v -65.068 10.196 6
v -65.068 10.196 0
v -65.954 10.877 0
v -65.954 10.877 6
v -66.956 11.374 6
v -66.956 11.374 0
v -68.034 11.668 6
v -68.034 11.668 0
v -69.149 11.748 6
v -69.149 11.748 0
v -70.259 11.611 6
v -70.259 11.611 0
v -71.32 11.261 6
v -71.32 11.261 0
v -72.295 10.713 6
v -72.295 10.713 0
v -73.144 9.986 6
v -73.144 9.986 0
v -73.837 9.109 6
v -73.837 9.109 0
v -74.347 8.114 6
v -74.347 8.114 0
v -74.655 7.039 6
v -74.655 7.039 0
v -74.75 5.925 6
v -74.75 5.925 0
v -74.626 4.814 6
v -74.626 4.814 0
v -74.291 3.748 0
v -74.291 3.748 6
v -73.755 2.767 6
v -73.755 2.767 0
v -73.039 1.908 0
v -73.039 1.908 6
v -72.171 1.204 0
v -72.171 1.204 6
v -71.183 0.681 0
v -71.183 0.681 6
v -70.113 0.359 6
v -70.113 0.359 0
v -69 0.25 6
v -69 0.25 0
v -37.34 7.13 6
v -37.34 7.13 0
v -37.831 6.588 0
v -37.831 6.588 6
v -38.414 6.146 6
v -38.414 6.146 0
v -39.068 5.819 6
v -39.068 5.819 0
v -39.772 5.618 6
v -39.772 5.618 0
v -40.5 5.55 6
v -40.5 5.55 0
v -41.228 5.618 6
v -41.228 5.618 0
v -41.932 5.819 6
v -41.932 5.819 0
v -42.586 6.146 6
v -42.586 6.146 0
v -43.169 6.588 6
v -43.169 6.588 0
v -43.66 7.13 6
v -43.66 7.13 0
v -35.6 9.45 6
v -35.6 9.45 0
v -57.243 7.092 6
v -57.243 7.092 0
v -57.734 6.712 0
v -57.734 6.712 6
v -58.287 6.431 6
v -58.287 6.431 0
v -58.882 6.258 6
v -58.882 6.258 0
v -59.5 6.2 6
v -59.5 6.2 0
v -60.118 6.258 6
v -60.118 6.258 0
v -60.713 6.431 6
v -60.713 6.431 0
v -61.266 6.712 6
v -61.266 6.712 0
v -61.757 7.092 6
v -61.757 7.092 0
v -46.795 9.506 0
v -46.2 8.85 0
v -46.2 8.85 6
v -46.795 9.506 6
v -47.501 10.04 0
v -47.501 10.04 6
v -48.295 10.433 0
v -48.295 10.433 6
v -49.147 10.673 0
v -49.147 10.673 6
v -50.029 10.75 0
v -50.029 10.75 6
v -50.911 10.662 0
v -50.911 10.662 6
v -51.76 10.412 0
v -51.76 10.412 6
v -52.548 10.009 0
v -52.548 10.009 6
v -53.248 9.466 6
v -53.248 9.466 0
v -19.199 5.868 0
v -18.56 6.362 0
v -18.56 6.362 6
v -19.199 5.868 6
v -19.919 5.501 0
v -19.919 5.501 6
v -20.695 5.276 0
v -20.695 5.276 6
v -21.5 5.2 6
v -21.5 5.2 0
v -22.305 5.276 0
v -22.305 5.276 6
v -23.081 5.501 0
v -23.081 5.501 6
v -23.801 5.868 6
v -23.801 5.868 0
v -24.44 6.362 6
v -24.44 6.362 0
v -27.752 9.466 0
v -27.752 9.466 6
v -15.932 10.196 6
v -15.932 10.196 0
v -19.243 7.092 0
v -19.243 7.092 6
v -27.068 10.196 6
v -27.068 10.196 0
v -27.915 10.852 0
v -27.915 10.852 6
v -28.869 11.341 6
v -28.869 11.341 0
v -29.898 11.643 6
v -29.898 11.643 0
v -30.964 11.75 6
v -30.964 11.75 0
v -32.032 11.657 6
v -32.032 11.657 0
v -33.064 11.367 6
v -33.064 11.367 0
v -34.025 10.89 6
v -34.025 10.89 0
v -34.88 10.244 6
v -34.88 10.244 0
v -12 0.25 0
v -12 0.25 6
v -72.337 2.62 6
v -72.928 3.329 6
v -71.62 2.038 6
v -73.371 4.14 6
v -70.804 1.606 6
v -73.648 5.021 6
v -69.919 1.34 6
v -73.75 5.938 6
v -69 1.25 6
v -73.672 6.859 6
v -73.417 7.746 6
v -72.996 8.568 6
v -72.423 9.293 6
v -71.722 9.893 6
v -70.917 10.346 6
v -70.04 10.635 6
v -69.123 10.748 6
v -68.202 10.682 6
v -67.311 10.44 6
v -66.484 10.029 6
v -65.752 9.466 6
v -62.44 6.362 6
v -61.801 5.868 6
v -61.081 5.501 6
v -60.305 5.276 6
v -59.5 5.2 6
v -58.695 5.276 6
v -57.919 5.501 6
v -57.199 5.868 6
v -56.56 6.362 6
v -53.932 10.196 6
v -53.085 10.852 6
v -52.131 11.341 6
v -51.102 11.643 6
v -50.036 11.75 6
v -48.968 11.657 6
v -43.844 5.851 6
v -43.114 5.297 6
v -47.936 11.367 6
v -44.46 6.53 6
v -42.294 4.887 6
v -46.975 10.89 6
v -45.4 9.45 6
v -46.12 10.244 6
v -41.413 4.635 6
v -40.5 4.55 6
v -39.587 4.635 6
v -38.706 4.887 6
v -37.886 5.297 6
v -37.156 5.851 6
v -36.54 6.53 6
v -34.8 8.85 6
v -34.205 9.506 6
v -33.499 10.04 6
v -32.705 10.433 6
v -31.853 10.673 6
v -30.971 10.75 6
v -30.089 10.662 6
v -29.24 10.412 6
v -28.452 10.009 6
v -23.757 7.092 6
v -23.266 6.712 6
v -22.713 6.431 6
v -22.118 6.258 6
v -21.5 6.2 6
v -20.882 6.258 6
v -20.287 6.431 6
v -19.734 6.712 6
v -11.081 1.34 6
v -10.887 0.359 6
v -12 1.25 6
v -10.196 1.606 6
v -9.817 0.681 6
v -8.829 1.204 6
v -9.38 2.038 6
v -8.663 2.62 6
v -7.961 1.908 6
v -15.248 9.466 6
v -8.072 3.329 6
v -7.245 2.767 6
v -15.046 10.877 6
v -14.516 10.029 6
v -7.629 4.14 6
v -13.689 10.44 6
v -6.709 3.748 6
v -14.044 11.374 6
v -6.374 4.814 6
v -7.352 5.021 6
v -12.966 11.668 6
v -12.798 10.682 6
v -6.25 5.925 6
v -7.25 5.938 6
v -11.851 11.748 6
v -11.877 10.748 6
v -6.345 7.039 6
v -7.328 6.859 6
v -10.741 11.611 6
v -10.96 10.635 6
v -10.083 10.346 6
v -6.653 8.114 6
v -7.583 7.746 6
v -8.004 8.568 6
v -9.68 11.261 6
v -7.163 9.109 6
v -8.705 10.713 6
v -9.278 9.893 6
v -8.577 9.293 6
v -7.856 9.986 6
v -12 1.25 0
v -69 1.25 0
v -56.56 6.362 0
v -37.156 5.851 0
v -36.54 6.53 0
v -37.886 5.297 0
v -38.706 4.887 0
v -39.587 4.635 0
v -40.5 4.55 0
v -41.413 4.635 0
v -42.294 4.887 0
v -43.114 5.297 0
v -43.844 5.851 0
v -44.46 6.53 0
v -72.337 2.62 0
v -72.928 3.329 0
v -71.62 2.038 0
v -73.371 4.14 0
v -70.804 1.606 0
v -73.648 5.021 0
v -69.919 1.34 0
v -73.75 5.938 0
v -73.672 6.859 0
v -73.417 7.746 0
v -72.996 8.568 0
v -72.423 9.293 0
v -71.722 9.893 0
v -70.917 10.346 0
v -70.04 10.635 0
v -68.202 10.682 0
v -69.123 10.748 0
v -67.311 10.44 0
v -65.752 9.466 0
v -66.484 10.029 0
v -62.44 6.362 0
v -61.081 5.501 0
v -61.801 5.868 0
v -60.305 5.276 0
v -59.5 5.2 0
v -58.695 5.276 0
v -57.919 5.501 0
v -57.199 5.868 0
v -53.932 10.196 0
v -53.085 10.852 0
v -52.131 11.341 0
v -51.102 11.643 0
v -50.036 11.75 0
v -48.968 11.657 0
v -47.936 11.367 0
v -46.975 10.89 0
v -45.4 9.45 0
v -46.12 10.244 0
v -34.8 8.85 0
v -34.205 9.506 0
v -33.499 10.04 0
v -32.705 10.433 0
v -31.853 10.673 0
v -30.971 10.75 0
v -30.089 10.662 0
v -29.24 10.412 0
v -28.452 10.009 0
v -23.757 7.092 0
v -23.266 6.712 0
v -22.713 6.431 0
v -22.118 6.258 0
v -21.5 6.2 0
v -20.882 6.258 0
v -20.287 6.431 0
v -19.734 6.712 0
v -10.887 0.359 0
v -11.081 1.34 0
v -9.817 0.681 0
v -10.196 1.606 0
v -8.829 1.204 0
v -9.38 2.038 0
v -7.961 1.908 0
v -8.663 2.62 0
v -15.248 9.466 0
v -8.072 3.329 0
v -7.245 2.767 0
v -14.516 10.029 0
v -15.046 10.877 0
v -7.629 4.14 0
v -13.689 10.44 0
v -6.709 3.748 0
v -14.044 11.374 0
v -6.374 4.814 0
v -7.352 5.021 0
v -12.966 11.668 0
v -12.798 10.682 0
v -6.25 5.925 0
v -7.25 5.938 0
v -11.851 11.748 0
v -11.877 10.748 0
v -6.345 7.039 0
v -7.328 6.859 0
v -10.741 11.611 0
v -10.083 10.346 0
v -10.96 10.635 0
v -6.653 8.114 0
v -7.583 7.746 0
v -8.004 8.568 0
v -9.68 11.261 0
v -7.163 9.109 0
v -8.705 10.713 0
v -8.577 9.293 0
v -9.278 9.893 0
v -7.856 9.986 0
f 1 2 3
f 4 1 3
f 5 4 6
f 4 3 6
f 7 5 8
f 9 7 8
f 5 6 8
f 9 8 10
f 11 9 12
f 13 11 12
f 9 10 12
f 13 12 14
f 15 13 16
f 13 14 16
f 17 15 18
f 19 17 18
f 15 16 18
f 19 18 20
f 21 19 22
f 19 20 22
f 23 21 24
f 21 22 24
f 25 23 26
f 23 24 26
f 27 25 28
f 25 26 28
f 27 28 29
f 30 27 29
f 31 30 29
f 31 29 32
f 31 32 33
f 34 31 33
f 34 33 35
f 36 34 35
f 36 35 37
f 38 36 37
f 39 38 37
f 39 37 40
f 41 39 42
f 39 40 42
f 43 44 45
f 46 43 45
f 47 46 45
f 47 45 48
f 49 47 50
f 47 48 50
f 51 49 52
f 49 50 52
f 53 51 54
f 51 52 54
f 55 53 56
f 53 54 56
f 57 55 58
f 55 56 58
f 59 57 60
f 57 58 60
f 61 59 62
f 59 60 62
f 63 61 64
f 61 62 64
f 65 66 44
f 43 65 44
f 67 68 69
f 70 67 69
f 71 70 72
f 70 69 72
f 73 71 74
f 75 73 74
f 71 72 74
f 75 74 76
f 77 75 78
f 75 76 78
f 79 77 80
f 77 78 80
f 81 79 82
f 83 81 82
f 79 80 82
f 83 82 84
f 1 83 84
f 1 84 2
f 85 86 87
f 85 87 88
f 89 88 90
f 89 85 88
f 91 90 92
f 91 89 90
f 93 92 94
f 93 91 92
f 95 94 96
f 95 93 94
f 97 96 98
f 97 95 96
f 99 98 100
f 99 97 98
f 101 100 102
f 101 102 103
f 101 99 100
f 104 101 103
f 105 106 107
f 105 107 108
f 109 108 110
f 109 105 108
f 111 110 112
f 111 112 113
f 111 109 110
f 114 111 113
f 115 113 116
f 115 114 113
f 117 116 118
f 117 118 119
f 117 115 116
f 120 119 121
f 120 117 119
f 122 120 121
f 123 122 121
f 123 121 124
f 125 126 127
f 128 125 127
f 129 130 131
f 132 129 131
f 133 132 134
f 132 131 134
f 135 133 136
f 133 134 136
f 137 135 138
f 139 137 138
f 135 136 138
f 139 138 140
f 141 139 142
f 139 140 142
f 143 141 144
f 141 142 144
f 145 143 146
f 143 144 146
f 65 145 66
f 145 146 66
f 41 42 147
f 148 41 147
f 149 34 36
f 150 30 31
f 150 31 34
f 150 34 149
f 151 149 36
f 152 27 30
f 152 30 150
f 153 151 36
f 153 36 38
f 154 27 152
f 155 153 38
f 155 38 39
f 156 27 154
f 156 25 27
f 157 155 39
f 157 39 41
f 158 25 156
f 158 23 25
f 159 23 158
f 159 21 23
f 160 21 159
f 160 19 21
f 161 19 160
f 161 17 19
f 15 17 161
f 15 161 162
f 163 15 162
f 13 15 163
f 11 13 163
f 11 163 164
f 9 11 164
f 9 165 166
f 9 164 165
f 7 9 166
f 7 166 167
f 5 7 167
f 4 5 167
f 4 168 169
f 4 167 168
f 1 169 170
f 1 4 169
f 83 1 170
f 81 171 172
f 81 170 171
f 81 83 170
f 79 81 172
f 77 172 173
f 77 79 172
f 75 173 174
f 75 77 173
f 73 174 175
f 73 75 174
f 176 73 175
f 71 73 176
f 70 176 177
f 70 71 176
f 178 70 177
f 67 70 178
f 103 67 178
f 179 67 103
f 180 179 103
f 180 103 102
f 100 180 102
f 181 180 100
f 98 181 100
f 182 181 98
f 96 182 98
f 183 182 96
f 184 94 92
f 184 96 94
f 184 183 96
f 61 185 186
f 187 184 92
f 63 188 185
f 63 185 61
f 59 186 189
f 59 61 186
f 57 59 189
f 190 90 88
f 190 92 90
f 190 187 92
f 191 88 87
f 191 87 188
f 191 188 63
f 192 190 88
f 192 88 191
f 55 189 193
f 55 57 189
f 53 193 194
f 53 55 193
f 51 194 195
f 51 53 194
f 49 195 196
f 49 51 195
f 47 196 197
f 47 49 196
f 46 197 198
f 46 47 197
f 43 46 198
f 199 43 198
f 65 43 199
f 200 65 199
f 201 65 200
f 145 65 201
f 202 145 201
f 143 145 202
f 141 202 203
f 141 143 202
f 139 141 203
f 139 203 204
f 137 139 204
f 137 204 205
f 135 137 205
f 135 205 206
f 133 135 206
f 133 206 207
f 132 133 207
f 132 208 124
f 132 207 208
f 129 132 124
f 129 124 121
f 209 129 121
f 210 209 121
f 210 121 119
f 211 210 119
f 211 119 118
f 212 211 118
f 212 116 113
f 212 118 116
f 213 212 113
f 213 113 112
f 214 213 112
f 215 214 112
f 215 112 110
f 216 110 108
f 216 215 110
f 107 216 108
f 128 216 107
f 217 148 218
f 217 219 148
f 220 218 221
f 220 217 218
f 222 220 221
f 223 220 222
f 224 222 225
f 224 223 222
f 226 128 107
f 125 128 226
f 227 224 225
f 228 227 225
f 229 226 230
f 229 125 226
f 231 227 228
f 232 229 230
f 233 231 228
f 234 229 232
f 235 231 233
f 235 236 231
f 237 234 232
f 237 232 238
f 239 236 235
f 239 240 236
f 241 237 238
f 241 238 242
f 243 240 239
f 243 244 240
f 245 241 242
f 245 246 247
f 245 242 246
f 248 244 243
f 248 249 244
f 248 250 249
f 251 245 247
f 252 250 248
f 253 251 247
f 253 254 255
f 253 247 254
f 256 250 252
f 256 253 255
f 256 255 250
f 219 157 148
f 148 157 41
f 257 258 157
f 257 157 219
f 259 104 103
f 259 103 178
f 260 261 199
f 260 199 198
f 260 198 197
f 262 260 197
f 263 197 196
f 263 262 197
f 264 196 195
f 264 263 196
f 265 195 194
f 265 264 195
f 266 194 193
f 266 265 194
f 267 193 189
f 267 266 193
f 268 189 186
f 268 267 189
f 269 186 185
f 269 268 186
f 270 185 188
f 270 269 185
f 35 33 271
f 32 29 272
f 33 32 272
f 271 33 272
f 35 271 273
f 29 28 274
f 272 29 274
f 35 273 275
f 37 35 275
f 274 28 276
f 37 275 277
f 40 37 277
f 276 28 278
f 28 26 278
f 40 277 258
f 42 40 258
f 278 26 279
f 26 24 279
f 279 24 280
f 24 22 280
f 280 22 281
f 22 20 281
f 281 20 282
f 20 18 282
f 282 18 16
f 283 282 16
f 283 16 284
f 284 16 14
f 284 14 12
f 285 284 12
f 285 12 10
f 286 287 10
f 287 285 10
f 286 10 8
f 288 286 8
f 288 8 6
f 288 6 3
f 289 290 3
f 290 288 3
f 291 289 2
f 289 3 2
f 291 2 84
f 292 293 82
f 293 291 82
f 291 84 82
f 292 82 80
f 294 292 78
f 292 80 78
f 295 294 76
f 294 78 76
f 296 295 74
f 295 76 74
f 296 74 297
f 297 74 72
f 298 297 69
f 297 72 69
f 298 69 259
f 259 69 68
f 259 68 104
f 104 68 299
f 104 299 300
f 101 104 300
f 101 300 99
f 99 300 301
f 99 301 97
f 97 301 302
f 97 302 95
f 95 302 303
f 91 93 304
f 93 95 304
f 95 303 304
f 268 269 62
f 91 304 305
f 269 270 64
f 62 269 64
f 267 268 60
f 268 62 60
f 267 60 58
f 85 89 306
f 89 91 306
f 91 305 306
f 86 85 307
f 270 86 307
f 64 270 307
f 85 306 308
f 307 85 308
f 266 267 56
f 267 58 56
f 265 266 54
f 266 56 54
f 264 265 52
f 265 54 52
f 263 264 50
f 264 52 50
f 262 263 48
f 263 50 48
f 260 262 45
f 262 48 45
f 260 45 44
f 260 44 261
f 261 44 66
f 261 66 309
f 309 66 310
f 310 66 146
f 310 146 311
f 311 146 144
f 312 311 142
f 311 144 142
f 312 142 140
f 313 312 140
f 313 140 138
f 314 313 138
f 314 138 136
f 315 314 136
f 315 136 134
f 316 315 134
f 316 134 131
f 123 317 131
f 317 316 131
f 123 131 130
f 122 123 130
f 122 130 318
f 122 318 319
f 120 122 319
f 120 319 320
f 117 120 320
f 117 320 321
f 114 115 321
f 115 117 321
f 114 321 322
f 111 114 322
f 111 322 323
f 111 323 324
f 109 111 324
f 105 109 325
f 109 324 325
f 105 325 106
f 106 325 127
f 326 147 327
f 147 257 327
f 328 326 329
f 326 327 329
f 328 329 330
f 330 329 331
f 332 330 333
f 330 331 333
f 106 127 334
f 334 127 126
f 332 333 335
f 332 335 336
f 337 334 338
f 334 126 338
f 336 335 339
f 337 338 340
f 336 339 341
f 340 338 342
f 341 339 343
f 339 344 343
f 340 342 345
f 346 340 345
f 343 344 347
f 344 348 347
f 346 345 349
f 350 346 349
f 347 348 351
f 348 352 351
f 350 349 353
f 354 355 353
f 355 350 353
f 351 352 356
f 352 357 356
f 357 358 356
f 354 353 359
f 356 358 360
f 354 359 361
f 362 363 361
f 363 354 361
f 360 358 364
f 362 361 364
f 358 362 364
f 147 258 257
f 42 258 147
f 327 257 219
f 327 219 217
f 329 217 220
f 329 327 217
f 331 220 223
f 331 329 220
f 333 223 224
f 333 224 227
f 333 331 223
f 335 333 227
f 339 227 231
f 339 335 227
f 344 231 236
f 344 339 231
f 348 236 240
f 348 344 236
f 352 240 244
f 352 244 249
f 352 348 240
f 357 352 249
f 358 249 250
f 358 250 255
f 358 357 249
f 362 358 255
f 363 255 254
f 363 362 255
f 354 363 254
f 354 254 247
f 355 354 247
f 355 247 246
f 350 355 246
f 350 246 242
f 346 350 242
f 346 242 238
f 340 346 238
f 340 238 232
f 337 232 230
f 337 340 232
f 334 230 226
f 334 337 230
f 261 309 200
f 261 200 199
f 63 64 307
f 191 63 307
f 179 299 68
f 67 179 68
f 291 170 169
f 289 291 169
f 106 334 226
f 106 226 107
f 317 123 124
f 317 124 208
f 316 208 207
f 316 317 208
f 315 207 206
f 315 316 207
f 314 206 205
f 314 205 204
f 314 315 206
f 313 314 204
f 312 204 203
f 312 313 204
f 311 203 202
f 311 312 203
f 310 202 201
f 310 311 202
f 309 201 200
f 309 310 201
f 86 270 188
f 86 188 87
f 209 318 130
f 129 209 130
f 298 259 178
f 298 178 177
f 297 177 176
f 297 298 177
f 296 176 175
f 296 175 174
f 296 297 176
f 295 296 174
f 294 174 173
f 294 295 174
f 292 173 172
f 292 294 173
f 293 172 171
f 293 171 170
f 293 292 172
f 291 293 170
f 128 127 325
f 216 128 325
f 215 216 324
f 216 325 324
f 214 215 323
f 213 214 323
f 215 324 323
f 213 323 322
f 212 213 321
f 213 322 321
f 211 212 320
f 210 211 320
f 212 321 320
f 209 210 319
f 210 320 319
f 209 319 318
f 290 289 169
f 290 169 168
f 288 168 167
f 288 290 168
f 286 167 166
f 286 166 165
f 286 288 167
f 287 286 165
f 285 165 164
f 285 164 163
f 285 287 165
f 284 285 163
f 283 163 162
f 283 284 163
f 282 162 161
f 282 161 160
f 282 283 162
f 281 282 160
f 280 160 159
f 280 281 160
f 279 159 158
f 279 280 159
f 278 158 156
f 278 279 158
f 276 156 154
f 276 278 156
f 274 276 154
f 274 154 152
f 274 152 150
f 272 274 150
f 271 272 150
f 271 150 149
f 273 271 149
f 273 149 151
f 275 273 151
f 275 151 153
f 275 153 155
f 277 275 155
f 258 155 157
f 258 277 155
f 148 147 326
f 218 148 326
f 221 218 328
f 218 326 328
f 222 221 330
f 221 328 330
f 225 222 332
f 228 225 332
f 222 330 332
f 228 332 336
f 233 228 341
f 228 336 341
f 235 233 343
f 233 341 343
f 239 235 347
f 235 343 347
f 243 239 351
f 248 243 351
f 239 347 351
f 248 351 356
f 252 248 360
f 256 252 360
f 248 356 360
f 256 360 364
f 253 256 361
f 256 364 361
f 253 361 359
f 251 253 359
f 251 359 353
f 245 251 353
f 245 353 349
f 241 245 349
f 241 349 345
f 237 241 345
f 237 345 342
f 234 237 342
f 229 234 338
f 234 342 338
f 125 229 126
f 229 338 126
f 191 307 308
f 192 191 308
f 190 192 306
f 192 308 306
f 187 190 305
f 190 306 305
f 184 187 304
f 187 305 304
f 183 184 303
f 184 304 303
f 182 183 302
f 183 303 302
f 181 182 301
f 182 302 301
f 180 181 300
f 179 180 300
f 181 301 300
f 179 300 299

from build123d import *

# Parameters (mm, degrees)
SURFACE_EXTRUDE2_1_DEPTH = 6
THICKEN2_T1              = 1


with BuildPart() as body_1:
    # Surface-Extrude2: a surface, the sketch's curves swept straight by 6 mm
    with BuildLine(Plane.XY, mode=Mode.PRIVATE) as surface_extrude2_1_path:
        Line((-69, 0.25), (-12, 0.25))
        ThreePointArc((-12, 0.25), (-6.652714965, 8.114011059), (-15.931902505, 10.195550345))
        Line((-15.931902505, 10.195550345), (-19.243429867, 7.092118933))
        ThreePointArc((-19.243429867, 7.092118933), (-21.5, 6.2), (-23.756570133, 7.092118933))
        Line((-23.756570133, 7.092118933), (-27.068097495, 10.195550345))
        ThreePointArc((-27.068097495, 10.195550345), (-31.500549593, 11.72817162), (-35.6, 9.45))
        Line((-35.6, 9.45), (-37.34, 7.13))
        ThreePointArc((-37.34, 7.13), (-40.5, 5.55), (-43.66, 7.13))
        Line((-43.66, 7.13), (-45.4, 9.45))
        ThreePointArc((-45.4, 9.45), (-49.499450407, 11.72817162), (-53.931902505, 10.195550345))
        Line((-53.931902505, 10.195550345), (-57.243429867, 7.092118933))
        ThreePointArc((-57.243429867, 7.092118933), (-59.5, 6.2), (-61.756570133, 7.092118933))
        Line((-61.756570133, 7.092118933), (-65.068097495, 10.195550345))
        ThreePointArc((-65.068097495, 10.195550345), (-74.347285035, 8.114011059), (-69, 0.25))
    surface_extrude2_1 = Shell.extrude(surface_extrude2_1_path.wire(), (0 * SURFACE_EXTRUDE2_1_DEPTH, 0 * SURFACE_EXTRUDE2_1_DEPTH, 1 * SURFACE_EXTRUDE2_1_DEPTH))
    add(Solid.thicken(surface_extrude2_1, THICKEN2_T1))


solid = body_1.part
